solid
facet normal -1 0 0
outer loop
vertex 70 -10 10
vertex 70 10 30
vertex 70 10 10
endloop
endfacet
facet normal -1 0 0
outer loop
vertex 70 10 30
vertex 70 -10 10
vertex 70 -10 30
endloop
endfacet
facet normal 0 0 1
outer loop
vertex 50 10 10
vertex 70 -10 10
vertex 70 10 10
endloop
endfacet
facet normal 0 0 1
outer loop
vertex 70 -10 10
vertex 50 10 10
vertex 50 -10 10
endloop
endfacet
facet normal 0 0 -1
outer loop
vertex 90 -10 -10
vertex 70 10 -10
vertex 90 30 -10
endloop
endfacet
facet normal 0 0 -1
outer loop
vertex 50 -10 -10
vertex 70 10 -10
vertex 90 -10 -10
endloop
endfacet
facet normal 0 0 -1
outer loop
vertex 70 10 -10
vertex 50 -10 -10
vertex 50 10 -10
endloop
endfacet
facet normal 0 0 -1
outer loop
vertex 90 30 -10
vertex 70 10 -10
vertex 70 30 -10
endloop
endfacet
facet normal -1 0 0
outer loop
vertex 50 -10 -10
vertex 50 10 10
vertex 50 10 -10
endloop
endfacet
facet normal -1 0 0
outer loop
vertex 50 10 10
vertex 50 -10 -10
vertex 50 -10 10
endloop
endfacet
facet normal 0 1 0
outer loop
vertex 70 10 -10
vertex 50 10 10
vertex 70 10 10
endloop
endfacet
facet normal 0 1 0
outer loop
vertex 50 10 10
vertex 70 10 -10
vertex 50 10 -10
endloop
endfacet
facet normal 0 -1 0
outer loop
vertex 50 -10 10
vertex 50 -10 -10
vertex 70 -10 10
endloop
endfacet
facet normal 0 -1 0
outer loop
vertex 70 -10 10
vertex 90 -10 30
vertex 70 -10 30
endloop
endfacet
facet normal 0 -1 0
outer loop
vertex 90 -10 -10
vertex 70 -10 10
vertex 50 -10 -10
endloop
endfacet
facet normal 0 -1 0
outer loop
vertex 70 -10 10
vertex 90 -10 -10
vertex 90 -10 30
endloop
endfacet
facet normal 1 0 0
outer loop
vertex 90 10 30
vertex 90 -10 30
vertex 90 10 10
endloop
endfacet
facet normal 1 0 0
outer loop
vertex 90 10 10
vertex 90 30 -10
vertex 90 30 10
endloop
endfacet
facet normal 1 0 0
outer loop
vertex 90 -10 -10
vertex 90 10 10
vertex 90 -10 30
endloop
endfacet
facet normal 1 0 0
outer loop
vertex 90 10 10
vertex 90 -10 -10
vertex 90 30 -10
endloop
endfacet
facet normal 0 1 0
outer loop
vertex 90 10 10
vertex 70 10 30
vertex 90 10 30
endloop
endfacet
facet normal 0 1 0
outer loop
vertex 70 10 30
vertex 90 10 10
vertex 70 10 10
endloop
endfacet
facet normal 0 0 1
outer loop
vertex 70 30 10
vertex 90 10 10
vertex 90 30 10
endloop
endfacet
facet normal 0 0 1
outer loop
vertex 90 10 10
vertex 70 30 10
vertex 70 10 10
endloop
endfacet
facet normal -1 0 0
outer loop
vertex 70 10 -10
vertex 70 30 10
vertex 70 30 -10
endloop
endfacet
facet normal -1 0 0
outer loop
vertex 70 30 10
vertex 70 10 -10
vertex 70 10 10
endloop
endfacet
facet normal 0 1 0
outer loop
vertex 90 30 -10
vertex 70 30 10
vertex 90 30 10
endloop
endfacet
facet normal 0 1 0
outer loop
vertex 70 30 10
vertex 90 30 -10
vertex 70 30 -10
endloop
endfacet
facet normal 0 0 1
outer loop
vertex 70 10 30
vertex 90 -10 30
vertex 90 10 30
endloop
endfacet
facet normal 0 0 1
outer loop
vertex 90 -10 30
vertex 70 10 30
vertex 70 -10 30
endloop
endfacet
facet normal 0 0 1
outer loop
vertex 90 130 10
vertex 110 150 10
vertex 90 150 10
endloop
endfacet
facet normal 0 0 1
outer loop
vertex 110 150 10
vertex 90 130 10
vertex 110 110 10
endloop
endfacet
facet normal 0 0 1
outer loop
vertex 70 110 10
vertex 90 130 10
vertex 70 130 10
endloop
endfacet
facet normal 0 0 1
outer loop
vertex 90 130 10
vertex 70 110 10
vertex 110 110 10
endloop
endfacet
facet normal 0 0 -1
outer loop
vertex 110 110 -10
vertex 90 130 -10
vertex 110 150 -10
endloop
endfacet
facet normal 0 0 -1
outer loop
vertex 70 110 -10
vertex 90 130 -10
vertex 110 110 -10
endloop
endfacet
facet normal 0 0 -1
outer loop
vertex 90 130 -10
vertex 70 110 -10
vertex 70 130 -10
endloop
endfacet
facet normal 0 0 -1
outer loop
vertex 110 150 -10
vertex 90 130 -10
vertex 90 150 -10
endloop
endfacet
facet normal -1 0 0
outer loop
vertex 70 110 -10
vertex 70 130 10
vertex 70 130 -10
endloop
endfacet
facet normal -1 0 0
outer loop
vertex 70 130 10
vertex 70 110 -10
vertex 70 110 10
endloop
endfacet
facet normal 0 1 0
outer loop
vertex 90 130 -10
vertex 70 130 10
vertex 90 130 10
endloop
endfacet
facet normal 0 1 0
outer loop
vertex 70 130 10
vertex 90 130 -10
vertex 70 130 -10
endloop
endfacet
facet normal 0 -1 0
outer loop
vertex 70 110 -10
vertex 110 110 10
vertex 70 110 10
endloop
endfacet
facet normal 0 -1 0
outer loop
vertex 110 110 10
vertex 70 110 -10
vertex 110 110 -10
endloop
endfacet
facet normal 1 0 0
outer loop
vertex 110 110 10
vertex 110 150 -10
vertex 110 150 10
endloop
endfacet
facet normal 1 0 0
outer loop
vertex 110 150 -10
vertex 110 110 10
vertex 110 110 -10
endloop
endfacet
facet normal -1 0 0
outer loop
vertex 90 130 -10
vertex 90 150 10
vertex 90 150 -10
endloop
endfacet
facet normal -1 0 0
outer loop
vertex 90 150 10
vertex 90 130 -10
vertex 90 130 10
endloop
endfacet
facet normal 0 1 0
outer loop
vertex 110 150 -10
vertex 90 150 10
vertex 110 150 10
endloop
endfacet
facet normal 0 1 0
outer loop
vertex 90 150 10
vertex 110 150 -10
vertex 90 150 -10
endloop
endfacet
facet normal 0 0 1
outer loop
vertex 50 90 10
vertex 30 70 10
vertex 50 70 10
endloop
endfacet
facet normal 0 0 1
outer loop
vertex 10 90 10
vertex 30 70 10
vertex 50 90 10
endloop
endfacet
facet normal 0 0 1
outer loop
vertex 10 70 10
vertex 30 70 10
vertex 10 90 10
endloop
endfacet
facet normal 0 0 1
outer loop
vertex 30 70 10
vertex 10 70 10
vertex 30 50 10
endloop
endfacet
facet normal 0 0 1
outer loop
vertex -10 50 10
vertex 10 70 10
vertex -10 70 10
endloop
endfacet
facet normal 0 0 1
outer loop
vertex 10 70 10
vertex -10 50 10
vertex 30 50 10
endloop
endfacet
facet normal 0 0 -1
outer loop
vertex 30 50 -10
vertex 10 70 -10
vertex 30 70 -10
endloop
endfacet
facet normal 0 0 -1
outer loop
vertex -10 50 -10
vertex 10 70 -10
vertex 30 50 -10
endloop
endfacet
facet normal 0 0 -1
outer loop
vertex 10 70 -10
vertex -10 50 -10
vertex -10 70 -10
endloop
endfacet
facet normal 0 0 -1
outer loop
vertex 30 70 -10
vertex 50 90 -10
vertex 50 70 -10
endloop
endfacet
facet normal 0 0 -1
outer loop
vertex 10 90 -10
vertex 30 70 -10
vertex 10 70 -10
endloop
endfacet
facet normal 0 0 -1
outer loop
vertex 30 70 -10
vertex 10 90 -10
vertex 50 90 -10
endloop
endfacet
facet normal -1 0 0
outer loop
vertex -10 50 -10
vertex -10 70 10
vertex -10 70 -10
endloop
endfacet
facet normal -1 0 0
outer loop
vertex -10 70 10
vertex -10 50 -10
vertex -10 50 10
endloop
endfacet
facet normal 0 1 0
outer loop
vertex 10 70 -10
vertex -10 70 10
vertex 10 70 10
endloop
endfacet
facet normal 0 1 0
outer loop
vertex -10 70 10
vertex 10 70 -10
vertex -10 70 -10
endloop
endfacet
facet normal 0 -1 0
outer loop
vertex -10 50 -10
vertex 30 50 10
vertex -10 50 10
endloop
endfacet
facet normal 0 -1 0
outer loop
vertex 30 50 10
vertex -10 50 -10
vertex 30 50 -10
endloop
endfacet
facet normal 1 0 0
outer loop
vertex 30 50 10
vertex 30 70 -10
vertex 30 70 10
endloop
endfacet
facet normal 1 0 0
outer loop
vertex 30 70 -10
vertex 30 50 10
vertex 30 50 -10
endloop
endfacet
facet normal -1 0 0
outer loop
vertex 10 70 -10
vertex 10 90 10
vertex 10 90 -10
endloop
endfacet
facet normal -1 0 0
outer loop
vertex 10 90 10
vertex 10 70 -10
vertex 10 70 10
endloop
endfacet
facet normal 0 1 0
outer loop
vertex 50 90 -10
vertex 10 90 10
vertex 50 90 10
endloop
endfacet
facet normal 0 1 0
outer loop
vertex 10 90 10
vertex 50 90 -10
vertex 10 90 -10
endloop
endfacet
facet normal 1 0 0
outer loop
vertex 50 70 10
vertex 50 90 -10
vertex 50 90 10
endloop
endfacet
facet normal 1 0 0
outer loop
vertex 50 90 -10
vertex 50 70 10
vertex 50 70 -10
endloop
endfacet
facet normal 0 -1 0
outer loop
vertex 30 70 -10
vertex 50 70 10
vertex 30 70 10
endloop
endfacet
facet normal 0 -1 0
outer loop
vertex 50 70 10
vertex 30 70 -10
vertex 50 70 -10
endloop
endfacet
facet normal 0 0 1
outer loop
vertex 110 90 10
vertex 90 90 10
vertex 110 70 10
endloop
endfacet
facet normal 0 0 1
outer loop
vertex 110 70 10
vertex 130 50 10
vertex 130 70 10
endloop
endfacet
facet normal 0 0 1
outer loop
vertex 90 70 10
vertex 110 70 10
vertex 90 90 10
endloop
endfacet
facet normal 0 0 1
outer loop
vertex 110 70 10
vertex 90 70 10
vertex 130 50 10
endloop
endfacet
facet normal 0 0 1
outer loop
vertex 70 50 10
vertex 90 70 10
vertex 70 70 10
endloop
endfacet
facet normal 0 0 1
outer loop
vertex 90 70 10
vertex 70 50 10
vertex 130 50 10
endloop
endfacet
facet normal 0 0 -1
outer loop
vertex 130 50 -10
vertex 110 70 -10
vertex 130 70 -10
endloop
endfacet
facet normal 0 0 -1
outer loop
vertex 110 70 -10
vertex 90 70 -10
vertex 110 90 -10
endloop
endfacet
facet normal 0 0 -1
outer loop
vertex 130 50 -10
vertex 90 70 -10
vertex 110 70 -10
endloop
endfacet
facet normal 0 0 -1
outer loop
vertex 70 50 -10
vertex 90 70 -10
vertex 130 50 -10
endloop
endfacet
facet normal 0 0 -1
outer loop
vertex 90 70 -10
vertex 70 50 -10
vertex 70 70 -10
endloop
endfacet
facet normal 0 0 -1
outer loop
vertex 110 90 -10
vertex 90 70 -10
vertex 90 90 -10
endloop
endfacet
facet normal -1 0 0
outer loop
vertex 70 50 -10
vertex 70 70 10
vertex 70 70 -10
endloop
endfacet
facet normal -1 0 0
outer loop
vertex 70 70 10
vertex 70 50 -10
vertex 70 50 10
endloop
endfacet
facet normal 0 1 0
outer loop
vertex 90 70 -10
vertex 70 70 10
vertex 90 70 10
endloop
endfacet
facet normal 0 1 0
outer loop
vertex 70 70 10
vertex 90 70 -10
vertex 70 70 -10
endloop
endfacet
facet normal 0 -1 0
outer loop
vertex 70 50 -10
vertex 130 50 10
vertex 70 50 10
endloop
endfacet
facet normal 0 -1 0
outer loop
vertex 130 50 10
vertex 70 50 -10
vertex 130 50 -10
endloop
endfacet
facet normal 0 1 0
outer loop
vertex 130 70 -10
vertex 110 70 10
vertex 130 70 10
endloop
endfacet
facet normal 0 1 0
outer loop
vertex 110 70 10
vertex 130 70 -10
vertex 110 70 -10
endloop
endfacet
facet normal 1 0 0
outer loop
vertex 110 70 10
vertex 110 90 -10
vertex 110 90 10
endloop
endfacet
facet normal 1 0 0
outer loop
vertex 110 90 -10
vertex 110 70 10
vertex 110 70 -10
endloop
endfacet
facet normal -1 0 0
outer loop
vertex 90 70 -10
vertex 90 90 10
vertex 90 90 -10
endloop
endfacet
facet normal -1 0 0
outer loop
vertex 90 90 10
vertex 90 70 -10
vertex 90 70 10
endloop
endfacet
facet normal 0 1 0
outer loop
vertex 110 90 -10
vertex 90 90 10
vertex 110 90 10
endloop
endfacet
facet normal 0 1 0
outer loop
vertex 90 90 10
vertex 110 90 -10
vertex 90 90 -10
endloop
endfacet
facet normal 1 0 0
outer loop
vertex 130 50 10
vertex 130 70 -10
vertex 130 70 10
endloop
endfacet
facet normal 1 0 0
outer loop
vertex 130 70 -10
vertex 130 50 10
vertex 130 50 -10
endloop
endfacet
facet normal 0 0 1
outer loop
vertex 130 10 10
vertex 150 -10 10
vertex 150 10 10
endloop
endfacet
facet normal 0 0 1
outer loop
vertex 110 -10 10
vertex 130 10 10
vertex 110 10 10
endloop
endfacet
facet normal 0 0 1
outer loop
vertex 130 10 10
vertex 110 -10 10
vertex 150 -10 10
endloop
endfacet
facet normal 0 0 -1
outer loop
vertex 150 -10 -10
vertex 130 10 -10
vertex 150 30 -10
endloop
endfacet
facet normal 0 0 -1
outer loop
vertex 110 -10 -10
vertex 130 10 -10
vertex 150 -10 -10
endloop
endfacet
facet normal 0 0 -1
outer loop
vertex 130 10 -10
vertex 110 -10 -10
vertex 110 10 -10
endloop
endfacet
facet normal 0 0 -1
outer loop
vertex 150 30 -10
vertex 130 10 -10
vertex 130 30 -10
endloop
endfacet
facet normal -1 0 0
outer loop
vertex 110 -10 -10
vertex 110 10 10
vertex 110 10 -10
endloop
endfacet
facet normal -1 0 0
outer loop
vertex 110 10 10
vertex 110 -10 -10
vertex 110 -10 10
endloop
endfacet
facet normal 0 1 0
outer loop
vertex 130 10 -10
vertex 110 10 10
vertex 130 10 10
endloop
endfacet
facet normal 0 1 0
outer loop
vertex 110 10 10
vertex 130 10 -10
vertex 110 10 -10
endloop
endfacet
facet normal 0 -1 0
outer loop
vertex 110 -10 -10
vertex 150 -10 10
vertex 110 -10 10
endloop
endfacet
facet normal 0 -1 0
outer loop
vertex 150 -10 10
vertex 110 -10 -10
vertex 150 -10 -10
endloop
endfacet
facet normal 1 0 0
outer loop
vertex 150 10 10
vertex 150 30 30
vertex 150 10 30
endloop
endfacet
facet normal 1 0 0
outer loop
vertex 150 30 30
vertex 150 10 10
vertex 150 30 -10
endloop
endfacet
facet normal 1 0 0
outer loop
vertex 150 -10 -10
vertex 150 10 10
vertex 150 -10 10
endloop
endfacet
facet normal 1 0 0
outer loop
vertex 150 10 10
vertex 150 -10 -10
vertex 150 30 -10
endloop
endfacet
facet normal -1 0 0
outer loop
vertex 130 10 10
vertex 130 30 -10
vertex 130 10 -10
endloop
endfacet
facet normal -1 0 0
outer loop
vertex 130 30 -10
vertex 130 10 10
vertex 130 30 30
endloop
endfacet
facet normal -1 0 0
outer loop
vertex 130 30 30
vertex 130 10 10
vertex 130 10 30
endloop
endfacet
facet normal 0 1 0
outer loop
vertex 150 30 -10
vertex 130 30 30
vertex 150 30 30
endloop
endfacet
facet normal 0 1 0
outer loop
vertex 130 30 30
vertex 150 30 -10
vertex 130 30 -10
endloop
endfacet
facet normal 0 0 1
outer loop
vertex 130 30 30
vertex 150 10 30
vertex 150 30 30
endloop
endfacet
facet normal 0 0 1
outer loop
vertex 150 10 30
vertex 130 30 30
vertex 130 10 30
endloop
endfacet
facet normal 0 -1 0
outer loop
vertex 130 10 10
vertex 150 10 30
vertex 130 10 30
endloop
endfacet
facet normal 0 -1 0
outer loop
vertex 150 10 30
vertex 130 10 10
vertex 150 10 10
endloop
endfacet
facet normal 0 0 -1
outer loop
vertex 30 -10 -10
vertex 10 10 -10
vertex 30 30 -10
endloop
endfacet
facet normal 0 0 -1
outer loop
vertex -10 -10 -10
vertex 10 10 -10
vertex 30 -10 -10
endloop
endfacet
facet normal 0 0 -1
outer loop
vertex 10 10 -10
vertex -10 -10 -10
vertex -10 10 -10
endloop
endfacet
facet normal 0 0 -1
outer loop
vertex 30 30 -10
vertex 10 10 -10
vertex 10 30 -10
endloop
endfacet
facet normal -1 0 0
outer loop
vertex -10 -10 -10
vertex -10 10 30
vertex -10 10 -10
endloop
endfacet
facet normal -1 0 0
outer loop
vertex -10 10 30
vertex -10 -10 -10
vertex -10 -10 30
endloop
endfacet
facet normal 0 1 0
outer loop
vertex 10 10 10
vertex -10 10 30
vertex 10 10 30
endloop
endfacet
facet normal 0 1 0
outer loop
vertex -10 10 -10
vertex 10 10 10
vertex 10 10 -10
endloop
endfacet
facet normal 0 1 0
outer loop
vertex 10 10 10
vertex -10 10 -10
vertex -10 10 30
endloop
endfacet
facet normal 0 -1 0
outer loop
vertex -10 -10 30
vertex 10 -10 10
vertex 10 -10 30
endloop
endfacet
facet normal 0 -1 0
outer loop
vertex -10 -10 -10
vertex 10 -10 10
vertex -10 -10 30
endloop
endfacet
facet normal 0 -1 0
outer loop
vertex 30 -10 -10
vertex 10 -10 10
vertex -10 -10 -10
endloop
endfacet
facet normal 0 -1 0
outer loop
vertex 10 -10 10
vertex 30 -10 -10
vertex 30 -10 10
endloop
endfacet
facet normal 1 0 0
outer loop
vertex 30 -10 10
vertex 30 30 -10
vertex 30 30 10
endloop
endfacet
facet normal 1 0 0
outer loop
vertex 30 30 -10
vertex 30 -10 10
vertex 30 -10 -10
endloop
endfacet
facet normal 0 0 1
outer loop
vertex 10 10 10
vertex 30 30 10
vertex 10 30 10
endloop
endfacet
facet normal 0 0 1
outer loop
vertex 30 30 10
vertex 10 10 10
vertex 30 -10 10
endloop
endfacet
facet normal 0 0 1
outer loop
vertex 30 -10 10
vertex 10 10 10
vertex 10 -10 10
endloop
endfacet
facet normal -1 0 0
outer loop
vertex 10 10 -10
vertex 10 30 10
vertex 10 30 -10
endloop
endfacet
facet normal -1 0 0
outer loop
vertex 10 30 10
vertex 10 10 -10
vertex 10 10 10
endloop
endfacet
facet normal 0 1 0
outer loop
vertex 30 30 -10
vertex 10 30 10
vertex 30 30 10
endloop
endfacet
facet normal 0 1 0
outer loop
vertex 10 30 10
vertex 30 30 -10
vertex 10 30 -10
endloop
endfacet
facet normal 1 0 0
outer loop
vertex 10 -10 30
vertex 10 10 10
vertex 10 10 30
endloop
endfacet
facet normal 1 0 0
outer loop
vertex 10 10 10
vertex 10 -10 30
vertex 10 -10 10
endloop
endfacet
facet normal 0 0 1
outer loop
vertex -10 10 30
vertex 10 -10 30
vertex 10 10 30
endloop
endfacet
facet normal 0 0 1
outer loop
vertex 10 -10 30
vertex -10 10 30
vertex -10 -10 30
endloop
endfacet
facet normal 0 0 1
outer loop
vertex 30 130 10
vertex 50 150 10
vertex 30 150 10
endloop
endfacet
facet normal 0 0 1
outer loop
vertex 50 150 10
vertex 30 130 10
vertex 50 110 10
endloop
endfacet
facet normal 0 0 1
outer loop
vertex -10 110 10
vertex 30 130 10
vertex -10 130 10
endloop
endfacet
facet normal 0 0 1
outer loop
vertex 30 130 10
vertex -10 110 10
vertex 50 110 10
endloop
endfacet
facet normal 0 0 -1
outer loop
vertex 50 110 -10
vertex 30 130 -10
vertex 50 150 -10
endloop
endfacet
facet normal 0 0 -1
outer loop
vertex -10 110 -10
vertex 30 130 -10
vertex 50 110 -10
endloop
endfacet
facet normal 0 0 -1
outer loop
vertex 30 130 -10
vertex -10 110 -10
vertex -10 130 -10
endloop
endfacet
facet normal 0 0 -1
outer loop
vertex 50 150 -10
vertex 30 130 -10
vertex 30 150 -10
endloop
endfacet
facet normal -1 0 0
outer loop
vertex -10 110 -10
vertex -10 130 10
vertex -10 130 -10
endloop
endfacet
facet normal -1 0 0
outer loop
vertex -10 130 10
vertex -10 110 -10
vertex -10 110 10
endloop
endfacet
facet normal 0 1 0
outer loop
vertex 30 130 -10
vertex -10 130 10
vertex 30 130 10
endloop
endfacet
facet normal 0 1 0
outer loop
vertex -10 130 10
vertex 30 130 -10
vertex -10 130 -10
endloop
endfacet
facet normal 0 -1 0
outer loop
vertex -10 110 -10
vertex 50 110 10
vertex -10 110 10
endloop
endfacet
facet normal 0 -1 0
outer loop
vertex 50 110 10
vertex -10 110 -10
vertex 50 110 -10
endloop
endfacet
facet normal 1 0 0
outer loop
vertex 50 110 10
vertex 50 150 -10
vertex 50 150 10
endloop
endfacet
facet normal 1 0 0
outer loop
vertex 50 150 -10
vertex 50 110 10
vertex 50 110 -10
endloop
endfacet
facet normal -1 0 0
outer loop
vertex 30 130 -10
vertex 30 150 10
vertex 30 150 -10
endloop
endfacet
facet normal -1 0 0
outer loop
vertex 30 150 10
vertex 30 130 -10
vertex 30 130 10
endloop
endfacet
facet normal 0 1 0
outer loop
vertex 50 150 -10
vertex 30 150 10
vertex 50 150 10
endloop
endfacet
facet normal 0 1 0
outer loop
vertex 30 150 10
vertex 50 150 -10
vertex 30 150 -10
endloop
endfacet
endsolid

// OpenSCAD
// Length of a cube side
side = 20;

module c()
{
  cube(size=side, center=true);
}


$fn = 100;

module c1()
{
  union()
  {
    c();
    translate([side,0,0]) c();
    translate([side,side,0]) c();
    translate([side,0,side]) c();
  }
}


module c2()
{
  union()
  {
    c();
    translate([side,0,0]) c();
    translate([side,side,0]) c();
  }
}


module c3()
{
  union()
  {
    c();
    translate([side,0,0]) c();
    translate([side,side,0]) c();
    translate([2 * side,side,0]) c();
  }
}


module c4()
{
  union()
  {
    c();
    translate([side,0,0]) c();
    translate([side,side,0]) c();
    translate([2 * side,0,0]) c();
  }
}


module c5()
{
  union()
  {
    c();
    translate([side,0,0]) c();
    translate([side,side,0]) c();
    translate([side,side,side]) c();
  }
}


module c6()
{
  union()
  {
    c();
    translate([side,0,0]) c();
    translate([side,side,0]) c();
    translate([0,0,side]) c();
  }
}


module c7()
{
  union()
  {
    c();
    translate([side,0,0]) c();
    translate([2 * side,side,0]) c();
    translate([2 * side,0,0]) c();
  }
}

translate([3 * side,0,0]) c1();
translate([4 * side,6 * side,0]) c2();
translate([0,3 * side,0]) c3();
translate([4 * side,3 * side,0]) c4();
translate([6 * side,0,0]) c5();
translate([0,0,0]) c6();
translate([0,6 * side,0]) c7();



